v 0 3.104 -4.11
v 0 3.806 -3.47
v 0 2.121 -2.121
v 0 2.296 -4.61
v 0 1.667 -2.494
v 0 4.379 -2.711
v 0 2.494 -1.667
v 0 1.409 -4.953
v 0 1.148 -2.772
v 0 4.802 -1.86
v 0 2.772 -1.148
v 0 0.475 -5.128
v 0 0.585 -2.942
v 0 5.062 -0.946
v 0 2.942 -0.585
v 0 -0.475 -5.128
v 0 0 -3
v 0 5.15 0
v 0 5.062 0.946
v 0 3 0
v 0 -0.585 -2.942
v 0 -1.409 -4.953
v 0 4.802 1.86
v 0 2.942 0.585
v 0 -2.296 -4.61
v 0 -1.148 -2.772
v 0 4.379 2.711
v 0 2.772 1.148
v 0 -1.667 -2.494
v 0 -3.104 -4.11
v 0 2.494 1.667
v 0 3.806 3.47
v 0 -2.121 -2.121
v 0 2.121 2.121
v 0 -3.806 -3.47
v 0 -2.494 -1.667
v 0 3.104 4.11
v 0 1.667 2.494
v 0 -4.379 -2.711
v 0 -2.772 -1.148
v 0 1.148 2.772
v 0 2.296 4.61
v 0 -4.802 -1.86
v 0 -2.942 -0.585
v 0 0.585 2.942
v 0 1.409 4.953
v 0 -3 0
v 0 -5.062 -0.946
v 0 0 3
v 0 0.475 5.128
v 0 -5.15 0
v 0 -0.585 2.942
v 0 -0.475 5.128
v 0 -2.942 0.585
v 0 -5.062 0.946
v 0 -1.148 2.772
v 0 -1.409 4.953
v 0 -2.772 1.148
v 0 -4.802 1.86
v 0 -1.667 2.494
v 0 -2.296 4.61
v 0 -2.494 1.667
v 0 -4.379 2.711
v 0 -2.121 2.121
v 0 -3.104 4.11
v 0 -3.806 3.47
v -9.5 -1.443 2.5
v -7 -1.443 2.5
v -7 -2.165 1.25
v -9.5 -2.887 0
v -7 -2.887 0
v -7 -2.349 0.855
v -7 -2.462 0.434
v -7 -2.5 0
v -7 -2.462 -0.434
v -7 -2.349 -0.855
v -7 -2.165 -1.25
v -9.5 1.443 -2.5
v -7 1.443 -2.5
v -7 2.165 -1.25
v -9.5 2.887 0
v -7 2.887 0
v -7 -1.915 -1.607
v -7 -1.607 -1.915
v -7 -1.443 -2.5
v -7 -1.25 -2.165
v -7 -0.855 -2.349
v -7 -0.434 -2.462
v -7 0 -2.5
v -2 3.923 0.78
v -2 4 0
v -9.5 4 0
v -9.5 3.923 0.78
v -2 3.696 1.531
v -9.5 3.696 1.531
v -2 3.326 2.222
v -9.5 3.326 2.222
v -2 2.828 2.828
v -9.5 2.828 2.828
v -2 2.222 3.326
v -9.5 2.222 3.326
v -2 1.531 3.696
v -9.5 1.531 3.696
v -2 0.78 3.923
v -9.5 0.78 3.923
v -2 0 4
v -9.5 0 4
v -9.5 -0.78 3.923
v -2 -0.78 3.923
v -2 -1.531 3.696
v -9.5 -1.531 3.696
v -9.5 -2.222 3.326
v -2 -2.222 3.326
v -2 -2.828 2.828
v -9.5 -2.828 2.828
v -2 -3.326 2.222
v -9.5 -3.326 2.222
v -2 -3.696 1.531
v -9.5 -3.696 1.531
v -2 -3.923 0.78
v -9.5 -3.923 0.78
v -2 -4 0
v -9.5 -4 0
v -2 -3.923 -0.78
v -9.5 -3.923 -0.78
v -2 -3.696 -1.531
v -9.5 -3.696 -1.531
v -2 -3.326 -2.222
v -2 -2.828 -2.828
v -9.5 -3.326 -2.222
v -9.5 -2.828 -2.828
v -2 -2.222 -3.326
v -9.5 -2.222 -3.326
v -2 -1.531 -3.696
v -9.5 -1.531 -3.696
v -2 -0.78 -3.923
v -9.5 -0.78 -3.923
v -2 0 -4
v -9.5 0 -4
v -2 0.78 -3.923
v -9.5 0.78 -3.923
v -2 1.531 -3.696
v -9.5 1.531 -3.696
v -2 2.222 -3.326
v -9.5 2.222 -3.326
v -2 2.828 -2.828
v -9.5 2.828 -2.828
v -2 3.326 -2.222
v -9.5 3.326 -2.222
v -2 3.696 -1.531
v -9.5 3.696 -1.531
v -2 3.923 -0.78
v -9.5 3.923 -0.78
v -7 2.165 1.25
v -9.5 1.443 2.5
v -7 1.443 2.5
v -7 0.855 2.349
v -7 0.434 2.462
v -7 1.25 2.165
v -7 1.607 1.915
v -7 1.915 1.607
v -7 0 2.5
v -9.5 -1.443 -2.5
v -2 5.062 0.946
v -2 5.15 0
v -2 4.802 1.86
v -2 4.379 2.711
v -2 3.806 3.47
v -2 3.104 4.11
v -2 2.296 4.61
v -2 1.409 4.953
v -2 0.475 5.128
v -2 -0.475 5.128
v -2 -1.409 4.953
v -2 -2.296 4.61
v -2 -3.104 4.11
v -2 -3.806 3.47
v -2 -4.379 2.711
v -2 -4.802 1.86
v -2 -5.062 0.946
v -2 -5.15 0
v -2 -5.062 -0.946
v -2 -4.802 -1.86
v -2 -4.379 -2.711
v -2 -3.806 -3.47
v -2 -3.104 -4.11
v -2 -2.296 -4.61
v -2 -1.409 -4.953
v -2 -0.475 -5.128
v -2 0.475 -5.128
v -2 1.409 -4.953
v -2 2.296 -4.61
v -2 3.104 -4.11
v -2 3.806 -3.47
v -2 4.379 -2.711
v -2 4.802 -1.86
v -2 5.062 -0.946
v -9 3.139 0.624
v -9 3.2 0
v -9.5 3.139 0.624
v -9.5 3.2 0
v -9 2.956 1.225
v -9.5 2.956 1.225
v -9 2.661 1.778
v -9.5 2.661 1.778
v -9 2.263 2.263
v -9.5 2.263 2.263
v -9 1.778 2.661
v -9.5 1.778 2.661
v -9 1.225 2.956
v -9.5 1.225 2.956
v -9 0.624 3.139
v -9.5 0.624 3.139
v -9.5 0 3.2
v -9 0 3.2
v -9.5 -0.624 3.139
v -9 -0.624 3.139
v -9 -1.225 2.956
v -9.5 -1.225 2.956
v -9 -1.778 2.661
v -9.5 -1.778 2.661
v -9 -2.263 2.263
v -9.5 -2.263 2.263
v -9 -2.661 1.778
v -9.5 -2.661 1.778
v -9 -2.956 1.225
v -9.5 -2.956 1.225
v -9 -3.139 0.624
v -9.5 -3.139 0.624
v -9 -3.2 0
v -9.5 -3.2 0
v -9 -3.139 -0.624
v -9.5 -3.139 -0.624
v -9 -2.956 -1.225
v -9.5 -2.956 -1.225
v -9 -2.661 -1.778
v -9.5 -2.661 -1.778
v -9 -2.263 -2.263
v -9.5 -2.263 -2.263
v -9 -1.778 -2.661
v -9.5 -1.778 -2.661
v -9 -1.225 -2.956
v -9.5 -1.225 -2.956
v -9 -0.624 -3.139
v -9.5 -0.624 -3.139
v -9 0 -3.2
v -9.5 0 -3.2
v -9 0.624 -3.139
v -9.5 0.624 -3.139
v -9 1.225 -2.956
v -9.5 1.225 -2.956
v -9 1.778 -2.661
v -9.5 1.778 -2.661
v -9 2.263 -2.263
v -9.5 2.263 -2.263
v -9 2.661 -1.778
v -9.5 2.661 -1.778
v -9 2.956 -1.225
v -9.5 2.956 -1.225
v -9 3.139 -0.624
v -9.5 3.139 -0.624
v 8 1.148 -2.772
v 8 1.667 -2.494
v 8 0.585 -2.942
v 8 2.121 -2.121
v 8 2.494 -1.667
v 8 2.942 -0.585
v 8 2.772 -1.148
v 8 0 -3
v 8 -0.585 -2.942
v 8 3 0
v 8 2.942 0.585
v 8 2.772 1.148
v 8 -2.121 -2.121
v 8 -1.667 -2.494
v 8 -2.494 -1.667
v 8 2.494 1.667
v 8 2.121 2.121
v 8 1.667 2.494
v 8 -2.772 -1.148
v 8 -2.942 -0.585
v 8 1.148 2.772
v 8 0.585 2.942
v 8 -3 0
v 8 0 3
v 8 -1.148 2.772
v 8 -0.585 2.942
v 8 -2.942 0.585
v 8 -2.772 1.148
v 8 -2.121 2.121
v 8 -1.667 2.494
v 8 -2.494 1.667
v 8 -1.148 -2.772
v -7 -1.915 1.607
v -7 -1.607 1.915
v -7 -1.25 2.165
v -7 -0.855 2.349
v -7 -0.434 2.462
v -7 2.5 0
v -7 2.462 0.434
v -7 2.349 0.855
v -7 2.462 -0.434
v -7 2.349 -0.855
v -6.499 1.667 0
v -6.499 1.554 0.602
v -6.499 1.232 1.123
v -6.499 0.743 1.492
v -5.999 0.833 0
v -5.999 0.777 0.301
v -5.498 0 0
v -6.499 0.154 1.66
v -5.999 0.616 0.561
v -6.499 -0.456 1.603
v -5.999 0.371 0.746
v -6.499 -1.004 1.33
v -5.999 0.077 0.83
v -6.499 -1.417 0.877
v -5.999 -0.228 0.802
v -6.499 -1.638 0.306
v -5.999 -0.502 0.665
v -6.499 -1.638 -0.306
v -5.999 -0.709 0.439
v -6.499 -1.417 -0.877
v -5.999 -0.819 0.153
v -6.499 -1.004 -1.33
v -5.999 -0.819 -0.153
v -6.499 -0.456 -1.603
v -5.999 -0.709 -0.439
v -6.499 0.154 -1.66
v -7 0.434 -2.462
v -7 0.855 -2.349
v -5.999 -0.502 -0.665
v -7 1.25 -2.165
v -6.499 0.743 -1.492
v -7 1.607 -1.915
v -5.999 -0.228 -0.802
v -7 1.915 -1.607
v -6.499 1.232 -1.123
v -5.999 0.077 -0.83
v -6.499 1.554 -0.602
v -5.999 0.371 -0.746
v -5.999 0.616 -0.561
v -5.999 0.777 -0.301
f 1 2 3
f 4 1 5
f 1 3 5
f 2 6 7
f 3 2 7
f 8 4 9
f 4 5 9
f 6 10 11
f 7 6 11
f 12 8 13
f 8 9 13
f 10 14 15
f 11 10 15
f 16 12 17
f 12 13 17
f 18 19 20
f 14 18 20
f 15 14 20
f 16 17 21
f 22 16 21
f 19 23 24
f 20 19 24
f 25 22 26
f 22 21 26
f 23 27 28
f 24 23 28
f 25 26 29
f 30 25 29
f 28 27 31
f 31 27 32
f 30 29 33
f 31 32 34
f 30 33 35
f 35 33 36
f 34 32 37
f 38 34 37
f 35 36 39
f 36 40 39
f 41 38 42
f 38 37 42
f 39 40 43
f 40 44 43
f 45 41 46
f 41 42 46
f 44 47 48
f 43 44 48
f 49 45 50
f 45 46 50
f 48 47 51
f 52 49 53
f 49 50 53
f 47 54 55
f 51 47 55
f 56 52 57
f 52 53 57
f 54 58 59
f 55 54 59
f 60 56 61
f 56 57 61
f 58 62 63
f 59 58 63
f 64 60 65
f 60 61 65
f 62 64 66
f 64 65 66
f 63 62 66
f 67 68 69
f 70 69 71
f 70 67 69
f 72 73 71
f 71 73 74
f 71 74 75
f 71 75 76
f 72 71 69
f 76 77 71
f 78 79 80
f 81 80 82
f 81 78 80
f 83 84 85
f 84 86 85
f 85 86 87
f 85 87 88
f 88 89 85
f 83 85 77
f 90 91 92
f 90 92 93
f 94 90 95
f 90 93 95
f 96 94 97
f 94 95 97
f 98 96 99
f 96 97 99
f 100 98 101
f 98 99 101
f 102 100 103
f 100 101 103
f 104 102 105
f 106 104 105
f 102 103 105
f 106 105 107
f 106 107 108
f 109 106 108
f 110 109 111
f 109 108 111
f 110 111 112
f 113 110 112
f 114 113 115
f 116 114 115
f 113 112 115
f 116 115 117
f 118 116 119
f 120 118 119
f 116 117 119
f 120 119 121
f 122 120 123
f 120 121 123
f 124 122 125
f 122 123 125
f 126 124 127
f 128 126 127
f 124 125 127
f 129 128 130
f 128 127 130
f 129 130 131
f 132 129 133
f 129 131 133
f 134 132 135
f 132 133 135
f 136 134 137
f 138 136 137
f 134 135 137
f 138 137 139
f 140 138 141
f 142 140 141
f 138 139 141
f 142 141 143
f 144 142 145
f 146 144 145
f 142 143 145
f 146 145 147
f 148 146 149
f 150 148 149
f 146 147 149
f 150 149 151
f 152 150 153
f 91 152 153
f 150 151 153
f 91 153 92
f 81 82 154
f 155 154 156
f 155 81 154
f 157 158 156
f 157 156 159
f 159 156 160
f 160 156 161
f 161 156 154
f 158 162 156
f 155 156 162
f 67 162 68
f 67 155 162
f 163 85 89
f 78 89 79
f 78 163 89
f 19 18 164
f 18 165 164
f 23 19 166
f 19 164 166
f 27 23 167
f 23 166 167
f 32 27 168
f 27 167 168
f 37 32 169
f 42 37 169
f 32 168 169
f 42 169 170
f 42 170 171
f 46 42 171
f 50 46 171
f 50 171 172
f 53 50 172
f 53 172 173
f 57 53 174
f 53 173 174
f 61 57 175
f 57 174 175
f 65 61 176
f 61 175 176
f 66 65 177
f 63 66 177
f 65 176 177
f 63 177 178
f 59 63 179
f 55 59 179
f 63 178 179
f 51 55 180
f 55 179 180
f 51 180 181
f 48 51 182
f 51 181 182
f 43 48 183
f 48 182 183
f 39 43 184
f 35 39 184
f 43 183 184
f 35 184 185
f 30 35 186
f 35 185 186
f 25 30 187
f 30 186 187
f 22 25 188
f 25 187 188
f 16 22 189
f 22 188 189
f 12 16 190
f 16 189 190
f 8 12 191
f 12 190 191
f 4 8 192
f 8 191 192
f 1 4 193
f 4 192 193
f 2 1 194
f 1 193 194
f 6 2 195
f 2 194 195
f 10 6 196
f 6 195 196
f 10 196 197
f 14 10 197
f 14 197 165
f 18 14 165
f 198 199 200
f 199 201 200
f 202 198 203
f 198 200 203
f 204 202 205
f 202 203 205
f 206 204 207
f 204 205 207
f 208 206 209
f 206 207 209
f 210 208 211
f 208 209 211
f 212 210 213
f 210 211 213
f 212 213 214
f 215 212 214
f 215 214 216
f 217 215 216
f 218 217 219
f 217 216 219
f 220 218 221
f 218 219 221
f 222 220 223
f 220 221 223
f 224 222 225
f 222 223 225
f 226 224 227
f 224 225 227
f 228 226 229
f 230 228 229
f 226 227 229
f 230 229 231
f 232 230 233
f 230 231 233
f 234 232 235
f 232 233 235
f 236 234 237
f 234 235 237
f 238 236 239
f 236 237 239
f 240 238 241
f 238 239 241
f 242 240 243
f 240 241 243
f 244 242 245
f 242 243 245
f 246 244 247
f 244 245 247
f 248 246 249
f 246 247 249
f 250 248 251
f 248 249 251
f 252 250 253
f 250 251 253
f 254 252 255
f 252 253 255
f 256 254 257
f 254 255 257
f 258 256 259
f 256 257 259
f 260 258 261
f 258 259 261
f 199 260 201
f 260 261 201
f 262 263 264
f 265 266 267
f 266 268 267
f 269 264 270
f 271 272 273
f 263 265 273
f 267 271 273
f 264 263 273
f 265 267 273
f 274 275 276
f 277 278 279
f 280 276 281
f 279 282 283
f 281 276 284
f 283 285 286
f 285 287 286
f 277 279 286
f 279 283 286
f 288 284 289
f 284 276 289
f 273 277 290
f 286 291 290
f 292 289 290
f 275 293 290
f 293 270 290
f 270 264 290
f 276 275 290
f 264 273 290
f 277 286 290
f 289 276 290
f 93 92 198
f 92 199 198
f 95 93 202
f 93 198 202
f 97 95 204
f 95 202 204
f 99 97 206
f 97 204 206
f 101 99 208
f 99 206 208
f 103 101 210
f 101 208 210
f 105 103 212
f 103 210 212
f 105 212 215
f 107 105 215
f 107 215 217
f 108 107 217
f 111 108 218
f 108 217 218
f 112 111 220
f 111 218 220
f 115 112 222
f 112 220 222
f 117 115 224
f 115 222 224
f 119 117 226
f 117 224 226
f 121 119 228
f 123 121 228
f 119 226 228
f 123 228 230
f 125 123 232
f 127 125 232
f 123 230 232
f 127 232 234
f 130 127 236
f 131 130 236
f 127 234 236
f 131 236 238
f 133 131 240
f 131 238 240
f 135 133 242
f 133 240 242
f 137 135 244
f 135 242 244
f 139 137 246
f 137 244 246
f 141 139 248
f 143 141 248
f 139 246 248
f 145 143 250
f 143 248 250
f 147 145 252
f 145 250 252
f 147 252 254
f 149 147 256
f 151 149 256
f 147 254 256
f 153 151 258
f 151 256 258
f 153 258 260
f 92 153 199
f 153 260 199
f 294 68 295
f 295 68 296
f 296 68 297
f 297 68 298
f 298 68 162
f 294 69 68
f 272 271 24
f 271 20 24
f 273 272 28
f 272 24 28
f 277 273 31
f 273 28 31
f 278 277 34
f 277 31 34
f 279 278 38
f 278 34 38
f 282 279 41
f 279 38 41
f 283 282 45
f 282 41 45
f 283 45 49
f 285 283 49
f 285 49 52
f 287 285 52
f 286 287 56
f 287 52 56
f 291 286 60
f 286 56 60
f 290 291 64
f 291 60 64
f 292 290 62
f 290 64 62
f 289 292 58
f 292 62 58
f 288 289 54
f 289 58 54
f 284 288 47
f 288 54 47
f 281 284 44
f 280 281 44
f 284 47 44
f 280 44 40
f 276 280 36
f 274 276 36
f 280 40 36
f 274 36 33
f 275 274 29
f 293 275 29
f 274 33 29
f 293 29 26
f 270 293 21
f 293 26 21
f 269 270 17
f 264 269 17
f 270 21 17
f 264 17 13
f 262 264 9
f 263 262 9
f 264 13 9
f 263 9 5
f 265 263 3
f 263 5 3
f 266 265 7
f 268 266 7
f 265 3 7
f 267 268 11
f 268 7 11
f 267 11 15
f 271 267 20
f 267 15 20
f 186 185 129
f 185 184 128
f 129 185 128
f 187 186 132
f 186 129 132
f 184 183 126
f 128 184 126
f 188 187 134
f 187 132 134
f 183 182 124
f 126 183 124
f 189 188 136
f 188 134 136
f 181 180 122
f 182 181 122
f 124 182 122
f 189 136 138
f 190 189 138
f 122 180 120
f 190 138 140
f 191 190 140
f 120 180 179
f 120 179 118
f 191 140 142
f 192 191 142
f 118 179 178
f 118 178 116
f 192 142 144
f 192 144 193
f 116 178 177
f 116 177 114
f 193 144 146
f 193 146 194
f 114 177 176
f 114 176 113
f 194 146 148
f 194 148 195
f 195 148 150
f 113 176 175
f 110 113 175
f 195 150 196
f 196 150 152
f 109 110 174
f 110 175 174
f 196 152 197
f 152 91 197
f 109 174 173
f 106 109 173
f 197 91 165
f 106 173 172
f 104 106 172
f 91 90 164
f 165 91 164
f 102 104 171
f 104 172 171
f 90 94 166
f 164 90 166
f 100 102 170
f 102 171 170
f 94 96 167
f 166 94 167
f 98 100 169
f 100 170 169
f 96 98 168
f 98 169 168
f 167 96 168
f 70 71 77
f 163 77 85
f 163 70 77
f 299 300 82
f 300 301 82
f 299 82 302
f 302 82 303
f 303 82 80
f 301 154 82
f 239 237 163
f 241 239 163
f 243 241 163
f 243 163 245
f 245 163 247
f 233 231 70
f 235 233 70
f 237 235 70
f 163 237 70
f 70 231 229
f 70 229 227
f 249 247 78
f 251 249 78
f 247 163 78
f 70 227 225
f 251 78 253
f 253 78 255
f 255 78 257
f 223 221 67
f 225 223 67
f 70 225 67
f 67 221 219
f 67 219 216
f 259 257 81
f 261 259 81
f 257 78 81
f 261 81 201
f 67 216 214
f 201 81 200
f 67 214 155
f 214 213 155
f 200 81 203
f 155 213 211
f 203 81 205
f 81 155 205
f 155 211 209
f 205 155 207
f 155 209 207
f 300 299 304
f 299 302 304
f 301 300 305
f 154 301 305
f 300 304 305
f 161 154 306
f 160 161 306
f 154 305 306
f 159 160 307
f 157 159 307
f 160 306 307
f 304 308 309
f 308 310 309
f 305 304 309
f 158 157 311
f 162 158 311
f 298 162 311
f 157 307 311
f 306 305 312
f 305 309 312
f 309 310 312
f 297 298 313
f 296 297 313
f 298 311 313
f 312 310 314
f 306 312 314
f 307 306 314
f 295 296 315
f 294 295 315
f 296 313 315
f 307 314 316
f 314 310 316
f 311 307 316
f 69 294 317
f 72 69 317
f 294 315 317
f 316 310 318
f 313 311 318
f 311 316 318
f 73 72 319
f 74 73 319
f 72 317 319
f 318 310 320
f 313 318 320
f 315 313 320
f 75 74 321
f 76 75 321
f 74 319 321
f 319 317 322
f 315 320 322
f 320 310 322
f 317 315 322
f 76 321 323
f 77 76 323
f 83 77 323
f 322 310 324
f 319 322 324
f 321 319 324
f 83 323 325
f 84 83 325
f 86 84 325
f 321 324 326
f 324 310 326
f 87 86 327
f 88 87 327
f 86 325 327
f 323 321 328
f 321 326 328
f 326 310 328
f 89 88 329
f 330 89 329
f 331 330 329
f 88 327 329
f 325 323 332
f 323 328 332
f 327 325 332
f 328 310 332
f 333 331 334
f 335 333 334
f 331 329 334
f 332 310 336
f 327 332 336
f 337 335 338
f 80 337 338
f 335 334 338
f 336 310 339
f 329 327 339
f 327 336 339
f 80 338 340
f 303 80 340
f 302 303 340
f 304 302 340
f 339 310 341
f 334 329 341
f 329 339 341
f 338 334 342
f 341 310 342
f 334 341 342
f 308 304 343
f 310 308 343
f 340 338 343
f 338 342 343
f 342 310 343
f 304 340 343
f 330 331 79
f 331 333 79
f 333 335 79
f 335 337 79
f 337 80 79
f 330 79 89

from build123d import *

# Parameters (mm, degrees)
CUT_EXTRUDE3_DEPTH = 2.5


with BuildPart() as part:
    # Sketch1 → Revolve1 (revolve)
    with BuildSketch(Plane.XY):
        Polygon((-9.5, 0), (8, 0), (8, 3), (0, 3), (0, 5.15), (-2, 5.15), (-2, 4), (-9.5, 4), (-9, 3.2), (-9.5, 3.2), align=None)
    revolve(axis=Axis((-9.190479794, 0, 0), (1, 0, 0)))

    # Sketch5 → Cut-Revolve1 (revolve, cut)
    with BuildSketch(Plane.XY):
        Polygon((-9.5, 2.5), (-7, 2.5), (-5.497848452, 0), (-9.5, 0), align=None)
    revolve(axis=Axis((-9.5, 0, 0), (1, 0, 0)), mode=Mode.SUBTRACT)

    # Sketch4 → Cut-Extrude3 (cut)
    with BuildSketch(Plane(origin=(-9.5, 0, 0), x_dir=(0, 0, -1), z_dir=(1, 0, 0))):
        Polygon((0, 2.886751346), (-2.5, 1.443375673), (-2.5, -1.443375673), (0, -2.886751346), (2.5, -1.443375673), (2.5, 1.443375673), align=None)
    extrude(amount=CUT_EXTRUDE3_DEPTH, mode=Mode.SUBTRACT)


solid = part.part
